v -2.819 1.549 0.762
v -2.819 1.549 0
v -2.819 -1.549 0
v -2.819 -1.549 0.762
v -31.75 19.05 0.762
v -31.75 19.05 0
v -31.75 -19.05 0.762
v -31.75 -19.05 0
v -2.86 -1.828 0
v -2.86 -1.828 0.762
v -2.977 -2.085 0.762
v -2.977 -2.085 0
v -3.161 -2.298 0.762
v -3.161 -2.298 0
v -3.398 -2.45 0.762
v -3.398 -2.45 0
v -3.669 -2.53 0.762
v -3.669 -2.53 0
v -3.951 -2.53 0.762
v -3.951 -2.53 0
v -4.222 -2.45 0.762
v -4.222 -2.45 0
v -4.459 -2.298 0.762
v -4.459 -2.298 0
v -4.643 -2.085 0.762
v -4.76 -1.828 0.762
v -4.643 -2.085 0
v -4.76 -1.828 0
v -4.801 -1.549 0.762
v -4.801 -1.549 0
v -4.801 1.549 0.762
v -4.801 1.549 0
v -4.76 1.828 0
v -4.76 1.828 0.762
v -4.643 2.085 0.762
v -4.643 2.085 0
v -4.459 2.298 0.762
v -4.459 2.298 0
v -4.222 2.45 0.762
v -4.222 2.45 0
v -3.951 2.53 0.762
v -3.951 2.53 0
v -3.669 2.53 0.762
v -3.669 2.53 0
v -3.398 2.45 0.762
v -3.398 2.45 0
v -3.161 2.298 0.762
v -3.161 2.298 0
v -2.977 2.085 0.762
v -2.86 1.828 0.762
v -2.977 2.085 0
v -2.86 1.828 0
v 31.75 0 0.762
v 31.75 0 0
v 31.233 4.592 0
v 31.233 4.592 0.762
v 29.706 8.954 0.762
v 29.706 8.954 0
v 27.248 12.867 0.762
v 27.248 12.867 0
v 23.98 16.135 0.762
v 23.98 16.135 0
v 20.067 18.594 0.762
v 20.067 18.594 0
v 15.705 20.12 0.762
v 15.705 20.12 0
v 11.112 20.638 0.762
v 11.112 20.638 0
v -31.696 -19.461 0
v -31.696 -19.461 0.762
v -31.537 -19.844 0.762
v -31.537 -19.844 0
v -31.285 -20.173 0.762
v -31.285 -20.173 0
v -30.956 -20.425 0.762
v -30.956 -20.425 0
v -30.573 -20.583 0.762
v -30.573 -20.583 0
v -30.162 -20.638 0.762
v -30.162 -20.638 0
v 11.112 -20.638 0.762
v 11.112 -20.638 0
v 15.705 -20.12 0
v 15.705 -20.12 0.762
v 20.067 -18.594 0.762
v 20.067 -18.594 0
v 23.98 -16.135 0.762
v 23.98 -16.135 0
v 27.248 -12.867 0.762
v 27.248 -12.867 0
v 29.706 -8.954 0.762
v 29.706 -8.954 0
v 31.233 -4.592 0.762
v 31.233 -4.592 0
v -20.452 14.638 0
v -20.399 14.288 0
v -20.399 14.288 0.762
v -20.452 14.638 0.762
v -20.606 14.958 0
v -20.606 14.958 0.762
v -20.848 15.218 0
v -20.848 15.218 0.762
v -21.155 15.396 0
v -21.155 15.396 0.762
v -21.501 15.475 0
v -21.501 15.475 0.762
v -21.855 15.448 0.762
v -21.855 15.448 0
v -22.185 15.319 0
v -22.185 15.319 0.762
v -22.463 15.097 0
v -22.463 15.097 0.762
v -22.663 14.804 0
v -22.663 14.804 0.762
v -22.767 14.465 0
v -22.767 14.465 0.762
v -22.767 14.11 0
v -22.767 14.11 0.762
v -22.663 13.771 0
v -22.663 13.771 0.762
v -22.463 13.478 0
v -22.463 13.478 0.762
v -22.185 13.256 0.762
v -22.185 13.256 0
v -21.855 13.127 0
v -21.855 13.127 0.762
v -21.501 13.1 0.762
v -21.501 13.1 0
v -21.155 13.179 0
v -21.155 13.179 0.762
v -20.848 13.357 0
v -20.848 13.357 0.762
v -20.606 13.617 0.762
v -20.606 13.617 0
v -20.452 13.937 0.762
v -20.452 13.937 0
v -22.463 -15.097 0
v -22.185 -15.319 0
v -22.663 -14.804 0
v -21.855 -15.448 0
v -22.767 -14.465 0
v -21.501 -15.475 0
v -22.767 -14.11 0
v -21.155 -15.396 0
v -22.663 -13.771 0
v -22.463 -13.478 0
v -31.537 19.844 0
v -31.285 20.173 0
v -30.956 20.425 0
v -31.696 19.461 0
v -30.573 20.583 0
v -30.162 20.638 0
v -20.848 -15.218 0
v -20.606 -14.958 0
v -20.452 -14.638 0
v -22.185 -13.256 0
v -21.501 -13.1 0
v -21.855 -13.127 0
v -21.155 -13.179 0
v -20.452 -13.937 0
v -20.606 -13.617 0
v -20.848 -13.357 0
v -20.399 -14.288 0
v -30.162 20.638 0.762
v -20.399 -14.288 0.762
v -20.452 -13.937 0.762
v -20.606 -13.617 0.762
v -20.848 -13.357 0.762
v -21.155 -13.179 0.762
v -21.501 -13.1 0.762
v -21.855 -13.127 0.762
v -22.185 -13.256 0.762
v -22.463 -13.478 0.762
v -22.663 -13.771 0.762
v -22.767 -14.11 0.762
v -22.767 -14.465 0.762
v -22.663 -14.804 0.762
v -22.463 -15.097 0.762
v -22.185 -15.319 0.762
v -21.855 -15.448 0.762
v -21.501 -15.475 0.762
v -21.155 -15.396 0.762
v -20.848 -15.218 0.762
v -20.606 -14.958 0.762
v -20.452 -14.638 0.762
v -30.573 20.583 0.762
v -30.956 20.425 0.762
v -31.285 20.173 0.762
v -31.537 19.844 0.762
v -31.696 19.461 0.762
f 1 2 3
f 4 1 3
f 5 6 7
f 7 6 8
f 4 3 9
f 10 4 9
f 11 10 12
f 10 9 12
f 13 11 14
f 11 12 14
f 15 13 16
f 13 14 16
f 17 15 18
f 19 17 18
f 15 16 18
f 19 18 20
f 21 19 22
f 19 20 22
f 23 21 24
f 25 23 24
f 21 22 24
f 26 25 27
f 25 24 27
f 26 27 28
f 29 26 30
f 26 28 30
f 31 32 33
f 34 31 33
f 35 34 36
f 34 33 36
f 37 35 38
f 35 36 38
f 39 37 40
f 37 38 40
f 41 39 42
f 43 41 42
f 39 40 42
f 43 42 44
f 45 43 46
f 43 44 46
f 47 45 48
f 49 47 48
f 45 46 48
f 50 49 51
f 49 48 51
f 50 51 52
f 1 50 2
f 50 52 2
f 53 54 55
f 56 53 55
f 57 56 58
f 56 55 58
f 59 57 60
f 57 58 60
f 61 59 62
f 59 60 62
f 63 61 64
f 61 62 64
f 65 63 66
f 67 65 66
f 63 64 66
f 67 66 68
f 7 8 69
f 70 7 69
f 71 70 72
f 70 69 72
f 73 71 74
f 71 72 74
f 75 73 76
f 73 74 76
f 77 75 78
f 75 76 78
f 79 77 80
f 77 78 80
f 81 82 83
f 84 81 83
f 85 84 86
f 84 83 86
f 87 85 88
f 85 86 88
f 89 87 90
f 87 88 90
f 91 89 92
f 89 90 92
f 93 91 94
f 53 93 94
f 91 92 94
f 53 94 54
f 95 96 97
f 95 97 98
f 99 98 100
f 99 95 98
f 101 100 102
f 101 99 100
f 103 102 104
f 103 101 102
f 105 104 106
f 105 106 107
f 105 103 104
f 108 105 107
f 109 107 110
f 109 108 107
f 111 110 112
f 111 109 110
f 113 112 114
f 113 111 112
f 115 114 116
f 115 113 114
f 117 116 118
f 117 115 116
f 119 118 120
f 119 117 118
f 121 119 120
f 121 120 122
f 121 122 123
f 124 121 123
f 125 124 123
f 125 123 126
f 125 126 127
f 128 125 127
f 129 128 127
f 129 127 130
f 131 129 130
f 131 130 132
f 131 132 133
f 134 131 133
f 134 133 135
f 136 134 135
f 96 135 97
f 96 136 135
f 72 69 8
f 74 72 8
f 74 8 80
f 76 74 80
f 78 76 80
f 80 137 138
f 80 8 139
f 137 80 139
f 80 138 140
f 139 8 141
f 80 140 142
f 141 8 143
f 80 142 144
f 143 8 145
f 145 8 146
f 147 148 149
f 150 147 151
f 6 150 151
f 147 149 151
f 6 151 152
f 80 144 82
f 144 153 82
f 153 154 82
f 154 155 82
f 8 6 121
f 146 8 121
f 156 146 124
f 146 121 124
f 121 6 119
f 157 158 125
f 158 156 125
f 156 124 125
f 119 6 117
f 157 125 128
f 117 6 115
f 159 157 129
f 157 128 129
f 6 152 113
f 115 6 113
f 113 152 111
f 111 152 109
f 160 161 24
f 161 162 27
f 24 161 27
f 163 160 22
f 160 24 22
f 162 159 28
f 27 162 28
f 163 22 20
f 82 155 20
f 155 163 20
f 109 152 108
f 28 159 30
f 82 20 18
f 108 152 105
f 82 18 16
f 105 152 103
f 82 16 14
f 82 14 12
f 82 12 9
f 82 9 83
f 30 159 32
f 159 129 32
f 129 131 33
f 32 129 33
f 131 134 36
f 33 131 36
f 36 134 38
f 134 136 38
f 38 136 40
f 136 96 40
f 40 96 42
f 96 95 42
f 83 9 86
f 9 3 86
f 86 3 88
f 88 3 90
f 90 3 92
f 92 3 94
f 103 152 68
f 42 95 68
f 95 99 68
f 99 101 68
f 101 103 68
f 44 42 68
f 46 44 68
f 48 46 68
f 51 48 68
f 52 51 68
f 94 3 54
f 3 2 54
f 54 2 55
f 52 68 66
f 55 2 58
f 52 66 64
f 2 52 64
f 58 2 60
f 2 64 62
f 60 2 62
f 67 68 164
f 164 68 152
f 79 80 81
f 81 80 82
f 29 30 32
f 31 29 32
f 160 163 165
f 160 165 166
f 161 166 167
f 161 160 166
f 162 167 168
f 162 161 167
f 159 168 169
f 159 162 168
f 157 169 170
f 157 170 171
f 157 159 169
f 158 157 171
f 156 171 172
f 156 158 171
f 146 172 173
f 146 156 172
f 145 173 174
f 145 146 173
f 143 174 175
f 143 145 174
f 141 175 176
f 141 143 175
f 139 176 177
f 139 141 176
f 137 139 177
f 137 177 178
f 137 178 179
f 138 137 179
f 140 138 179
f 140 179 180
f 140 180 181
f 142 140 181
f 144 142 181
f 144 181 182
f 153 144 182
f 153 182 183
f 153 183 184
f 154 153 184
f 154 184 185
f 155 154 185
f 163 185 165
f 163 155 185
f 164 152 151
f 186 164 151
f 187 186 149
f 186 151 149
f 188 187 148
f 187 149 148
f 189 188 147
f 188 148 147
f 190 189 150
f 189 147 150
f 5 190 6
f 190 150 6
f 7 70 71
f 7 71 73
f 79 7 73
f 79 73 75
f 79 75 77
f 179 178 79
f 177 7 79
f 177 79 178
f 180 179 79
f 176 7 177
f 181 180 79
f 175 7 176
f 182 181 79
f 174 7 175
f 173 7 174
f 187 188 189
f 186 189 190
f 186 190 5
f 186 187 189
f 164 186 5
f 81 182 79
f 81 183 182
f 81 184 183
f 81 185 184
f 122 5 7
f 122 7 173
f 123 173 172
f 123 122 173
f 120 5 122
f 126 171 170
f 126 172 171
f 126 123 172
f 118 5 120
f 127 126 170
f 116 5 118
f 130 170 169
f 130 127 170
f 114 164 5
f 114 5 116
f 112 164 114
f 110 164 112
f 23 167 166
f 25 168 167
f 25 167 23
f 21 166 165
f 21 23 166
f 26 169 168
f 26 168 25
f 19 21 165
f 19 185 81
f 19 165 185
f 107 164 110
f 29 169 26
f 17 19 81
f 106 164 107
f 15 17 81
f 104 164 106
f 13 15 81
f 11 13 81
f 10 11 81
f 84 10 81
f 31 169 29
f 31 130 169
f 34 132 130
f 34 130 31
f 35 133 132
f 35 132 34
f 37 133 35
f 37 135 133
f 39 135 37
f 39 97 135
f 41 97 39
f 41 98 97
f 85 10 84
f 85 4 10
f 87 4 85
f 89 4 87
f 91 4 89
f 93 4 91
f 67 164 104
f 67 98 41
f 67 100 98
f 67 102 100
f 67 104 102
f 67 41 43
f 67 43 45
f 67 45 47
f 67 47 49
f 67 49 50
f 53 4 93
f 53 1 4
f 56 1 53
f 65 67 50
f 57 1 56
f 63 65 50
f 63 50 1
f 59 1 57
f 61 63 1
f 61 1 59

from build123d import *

# Parameters (mm, degrees)
F0_R     = 1.190625
F1_DEPTH = 0.762


with BuildPart() as f1:
    # F0 (on Top) → F1 (new body)
    with BuildSketch(Plane.XY):
        with BuildLine():
            Line((-30.1625, -20.6375), (11.1125, -20.6375))
            ThreePointArc((11.1125, -20.6375), (25.705416, -14.592916), (31.75, 0))
            ThreePointArc((31.75, 0), (25.705416, 14.592916), (11.1125, 20.6375))
            Line((11.1125, 20.6375), (-30.1625, 20.6375))
            ThreePointArc((-30.1625, 20.6375), (-31.285032, 20.172532), (-31.75, 19.05))
            Line((-31.75, 19.05), (-31.75, -19.05))
            ThreePointArc((-31.75, -19.05), (-31.285032, -20.172532), (-30.1625, -20.6375))
        make_face()
        with Locations((-21.59, -14.2875)):
            Circle(F0_R, mode=Mode.SUBTRACT)
        with BuildLine():
            Line((-2.8194, 1.5494), (-2.8194, -1.5494))
            ThreePointArc((-2.8194, -1.5494), (-3.81, -2.54), (-4.8006, -1.5494))
            Line((-4.8006, -1.5494), (-4.8006, 1.5494))
            ThreePointArc((-4.8006, 1.5494), (-3.81, 2.54), (-2.8194, 1.5494))
        make_face(mode=Mode.SUBTRACT)
        with Locations((-21.59, 14.2875)):
            Circle(F0_R, mode=Mode.SUBTRACT)
    extrude(amount=F1_DEPTH)


solid = f1.part
